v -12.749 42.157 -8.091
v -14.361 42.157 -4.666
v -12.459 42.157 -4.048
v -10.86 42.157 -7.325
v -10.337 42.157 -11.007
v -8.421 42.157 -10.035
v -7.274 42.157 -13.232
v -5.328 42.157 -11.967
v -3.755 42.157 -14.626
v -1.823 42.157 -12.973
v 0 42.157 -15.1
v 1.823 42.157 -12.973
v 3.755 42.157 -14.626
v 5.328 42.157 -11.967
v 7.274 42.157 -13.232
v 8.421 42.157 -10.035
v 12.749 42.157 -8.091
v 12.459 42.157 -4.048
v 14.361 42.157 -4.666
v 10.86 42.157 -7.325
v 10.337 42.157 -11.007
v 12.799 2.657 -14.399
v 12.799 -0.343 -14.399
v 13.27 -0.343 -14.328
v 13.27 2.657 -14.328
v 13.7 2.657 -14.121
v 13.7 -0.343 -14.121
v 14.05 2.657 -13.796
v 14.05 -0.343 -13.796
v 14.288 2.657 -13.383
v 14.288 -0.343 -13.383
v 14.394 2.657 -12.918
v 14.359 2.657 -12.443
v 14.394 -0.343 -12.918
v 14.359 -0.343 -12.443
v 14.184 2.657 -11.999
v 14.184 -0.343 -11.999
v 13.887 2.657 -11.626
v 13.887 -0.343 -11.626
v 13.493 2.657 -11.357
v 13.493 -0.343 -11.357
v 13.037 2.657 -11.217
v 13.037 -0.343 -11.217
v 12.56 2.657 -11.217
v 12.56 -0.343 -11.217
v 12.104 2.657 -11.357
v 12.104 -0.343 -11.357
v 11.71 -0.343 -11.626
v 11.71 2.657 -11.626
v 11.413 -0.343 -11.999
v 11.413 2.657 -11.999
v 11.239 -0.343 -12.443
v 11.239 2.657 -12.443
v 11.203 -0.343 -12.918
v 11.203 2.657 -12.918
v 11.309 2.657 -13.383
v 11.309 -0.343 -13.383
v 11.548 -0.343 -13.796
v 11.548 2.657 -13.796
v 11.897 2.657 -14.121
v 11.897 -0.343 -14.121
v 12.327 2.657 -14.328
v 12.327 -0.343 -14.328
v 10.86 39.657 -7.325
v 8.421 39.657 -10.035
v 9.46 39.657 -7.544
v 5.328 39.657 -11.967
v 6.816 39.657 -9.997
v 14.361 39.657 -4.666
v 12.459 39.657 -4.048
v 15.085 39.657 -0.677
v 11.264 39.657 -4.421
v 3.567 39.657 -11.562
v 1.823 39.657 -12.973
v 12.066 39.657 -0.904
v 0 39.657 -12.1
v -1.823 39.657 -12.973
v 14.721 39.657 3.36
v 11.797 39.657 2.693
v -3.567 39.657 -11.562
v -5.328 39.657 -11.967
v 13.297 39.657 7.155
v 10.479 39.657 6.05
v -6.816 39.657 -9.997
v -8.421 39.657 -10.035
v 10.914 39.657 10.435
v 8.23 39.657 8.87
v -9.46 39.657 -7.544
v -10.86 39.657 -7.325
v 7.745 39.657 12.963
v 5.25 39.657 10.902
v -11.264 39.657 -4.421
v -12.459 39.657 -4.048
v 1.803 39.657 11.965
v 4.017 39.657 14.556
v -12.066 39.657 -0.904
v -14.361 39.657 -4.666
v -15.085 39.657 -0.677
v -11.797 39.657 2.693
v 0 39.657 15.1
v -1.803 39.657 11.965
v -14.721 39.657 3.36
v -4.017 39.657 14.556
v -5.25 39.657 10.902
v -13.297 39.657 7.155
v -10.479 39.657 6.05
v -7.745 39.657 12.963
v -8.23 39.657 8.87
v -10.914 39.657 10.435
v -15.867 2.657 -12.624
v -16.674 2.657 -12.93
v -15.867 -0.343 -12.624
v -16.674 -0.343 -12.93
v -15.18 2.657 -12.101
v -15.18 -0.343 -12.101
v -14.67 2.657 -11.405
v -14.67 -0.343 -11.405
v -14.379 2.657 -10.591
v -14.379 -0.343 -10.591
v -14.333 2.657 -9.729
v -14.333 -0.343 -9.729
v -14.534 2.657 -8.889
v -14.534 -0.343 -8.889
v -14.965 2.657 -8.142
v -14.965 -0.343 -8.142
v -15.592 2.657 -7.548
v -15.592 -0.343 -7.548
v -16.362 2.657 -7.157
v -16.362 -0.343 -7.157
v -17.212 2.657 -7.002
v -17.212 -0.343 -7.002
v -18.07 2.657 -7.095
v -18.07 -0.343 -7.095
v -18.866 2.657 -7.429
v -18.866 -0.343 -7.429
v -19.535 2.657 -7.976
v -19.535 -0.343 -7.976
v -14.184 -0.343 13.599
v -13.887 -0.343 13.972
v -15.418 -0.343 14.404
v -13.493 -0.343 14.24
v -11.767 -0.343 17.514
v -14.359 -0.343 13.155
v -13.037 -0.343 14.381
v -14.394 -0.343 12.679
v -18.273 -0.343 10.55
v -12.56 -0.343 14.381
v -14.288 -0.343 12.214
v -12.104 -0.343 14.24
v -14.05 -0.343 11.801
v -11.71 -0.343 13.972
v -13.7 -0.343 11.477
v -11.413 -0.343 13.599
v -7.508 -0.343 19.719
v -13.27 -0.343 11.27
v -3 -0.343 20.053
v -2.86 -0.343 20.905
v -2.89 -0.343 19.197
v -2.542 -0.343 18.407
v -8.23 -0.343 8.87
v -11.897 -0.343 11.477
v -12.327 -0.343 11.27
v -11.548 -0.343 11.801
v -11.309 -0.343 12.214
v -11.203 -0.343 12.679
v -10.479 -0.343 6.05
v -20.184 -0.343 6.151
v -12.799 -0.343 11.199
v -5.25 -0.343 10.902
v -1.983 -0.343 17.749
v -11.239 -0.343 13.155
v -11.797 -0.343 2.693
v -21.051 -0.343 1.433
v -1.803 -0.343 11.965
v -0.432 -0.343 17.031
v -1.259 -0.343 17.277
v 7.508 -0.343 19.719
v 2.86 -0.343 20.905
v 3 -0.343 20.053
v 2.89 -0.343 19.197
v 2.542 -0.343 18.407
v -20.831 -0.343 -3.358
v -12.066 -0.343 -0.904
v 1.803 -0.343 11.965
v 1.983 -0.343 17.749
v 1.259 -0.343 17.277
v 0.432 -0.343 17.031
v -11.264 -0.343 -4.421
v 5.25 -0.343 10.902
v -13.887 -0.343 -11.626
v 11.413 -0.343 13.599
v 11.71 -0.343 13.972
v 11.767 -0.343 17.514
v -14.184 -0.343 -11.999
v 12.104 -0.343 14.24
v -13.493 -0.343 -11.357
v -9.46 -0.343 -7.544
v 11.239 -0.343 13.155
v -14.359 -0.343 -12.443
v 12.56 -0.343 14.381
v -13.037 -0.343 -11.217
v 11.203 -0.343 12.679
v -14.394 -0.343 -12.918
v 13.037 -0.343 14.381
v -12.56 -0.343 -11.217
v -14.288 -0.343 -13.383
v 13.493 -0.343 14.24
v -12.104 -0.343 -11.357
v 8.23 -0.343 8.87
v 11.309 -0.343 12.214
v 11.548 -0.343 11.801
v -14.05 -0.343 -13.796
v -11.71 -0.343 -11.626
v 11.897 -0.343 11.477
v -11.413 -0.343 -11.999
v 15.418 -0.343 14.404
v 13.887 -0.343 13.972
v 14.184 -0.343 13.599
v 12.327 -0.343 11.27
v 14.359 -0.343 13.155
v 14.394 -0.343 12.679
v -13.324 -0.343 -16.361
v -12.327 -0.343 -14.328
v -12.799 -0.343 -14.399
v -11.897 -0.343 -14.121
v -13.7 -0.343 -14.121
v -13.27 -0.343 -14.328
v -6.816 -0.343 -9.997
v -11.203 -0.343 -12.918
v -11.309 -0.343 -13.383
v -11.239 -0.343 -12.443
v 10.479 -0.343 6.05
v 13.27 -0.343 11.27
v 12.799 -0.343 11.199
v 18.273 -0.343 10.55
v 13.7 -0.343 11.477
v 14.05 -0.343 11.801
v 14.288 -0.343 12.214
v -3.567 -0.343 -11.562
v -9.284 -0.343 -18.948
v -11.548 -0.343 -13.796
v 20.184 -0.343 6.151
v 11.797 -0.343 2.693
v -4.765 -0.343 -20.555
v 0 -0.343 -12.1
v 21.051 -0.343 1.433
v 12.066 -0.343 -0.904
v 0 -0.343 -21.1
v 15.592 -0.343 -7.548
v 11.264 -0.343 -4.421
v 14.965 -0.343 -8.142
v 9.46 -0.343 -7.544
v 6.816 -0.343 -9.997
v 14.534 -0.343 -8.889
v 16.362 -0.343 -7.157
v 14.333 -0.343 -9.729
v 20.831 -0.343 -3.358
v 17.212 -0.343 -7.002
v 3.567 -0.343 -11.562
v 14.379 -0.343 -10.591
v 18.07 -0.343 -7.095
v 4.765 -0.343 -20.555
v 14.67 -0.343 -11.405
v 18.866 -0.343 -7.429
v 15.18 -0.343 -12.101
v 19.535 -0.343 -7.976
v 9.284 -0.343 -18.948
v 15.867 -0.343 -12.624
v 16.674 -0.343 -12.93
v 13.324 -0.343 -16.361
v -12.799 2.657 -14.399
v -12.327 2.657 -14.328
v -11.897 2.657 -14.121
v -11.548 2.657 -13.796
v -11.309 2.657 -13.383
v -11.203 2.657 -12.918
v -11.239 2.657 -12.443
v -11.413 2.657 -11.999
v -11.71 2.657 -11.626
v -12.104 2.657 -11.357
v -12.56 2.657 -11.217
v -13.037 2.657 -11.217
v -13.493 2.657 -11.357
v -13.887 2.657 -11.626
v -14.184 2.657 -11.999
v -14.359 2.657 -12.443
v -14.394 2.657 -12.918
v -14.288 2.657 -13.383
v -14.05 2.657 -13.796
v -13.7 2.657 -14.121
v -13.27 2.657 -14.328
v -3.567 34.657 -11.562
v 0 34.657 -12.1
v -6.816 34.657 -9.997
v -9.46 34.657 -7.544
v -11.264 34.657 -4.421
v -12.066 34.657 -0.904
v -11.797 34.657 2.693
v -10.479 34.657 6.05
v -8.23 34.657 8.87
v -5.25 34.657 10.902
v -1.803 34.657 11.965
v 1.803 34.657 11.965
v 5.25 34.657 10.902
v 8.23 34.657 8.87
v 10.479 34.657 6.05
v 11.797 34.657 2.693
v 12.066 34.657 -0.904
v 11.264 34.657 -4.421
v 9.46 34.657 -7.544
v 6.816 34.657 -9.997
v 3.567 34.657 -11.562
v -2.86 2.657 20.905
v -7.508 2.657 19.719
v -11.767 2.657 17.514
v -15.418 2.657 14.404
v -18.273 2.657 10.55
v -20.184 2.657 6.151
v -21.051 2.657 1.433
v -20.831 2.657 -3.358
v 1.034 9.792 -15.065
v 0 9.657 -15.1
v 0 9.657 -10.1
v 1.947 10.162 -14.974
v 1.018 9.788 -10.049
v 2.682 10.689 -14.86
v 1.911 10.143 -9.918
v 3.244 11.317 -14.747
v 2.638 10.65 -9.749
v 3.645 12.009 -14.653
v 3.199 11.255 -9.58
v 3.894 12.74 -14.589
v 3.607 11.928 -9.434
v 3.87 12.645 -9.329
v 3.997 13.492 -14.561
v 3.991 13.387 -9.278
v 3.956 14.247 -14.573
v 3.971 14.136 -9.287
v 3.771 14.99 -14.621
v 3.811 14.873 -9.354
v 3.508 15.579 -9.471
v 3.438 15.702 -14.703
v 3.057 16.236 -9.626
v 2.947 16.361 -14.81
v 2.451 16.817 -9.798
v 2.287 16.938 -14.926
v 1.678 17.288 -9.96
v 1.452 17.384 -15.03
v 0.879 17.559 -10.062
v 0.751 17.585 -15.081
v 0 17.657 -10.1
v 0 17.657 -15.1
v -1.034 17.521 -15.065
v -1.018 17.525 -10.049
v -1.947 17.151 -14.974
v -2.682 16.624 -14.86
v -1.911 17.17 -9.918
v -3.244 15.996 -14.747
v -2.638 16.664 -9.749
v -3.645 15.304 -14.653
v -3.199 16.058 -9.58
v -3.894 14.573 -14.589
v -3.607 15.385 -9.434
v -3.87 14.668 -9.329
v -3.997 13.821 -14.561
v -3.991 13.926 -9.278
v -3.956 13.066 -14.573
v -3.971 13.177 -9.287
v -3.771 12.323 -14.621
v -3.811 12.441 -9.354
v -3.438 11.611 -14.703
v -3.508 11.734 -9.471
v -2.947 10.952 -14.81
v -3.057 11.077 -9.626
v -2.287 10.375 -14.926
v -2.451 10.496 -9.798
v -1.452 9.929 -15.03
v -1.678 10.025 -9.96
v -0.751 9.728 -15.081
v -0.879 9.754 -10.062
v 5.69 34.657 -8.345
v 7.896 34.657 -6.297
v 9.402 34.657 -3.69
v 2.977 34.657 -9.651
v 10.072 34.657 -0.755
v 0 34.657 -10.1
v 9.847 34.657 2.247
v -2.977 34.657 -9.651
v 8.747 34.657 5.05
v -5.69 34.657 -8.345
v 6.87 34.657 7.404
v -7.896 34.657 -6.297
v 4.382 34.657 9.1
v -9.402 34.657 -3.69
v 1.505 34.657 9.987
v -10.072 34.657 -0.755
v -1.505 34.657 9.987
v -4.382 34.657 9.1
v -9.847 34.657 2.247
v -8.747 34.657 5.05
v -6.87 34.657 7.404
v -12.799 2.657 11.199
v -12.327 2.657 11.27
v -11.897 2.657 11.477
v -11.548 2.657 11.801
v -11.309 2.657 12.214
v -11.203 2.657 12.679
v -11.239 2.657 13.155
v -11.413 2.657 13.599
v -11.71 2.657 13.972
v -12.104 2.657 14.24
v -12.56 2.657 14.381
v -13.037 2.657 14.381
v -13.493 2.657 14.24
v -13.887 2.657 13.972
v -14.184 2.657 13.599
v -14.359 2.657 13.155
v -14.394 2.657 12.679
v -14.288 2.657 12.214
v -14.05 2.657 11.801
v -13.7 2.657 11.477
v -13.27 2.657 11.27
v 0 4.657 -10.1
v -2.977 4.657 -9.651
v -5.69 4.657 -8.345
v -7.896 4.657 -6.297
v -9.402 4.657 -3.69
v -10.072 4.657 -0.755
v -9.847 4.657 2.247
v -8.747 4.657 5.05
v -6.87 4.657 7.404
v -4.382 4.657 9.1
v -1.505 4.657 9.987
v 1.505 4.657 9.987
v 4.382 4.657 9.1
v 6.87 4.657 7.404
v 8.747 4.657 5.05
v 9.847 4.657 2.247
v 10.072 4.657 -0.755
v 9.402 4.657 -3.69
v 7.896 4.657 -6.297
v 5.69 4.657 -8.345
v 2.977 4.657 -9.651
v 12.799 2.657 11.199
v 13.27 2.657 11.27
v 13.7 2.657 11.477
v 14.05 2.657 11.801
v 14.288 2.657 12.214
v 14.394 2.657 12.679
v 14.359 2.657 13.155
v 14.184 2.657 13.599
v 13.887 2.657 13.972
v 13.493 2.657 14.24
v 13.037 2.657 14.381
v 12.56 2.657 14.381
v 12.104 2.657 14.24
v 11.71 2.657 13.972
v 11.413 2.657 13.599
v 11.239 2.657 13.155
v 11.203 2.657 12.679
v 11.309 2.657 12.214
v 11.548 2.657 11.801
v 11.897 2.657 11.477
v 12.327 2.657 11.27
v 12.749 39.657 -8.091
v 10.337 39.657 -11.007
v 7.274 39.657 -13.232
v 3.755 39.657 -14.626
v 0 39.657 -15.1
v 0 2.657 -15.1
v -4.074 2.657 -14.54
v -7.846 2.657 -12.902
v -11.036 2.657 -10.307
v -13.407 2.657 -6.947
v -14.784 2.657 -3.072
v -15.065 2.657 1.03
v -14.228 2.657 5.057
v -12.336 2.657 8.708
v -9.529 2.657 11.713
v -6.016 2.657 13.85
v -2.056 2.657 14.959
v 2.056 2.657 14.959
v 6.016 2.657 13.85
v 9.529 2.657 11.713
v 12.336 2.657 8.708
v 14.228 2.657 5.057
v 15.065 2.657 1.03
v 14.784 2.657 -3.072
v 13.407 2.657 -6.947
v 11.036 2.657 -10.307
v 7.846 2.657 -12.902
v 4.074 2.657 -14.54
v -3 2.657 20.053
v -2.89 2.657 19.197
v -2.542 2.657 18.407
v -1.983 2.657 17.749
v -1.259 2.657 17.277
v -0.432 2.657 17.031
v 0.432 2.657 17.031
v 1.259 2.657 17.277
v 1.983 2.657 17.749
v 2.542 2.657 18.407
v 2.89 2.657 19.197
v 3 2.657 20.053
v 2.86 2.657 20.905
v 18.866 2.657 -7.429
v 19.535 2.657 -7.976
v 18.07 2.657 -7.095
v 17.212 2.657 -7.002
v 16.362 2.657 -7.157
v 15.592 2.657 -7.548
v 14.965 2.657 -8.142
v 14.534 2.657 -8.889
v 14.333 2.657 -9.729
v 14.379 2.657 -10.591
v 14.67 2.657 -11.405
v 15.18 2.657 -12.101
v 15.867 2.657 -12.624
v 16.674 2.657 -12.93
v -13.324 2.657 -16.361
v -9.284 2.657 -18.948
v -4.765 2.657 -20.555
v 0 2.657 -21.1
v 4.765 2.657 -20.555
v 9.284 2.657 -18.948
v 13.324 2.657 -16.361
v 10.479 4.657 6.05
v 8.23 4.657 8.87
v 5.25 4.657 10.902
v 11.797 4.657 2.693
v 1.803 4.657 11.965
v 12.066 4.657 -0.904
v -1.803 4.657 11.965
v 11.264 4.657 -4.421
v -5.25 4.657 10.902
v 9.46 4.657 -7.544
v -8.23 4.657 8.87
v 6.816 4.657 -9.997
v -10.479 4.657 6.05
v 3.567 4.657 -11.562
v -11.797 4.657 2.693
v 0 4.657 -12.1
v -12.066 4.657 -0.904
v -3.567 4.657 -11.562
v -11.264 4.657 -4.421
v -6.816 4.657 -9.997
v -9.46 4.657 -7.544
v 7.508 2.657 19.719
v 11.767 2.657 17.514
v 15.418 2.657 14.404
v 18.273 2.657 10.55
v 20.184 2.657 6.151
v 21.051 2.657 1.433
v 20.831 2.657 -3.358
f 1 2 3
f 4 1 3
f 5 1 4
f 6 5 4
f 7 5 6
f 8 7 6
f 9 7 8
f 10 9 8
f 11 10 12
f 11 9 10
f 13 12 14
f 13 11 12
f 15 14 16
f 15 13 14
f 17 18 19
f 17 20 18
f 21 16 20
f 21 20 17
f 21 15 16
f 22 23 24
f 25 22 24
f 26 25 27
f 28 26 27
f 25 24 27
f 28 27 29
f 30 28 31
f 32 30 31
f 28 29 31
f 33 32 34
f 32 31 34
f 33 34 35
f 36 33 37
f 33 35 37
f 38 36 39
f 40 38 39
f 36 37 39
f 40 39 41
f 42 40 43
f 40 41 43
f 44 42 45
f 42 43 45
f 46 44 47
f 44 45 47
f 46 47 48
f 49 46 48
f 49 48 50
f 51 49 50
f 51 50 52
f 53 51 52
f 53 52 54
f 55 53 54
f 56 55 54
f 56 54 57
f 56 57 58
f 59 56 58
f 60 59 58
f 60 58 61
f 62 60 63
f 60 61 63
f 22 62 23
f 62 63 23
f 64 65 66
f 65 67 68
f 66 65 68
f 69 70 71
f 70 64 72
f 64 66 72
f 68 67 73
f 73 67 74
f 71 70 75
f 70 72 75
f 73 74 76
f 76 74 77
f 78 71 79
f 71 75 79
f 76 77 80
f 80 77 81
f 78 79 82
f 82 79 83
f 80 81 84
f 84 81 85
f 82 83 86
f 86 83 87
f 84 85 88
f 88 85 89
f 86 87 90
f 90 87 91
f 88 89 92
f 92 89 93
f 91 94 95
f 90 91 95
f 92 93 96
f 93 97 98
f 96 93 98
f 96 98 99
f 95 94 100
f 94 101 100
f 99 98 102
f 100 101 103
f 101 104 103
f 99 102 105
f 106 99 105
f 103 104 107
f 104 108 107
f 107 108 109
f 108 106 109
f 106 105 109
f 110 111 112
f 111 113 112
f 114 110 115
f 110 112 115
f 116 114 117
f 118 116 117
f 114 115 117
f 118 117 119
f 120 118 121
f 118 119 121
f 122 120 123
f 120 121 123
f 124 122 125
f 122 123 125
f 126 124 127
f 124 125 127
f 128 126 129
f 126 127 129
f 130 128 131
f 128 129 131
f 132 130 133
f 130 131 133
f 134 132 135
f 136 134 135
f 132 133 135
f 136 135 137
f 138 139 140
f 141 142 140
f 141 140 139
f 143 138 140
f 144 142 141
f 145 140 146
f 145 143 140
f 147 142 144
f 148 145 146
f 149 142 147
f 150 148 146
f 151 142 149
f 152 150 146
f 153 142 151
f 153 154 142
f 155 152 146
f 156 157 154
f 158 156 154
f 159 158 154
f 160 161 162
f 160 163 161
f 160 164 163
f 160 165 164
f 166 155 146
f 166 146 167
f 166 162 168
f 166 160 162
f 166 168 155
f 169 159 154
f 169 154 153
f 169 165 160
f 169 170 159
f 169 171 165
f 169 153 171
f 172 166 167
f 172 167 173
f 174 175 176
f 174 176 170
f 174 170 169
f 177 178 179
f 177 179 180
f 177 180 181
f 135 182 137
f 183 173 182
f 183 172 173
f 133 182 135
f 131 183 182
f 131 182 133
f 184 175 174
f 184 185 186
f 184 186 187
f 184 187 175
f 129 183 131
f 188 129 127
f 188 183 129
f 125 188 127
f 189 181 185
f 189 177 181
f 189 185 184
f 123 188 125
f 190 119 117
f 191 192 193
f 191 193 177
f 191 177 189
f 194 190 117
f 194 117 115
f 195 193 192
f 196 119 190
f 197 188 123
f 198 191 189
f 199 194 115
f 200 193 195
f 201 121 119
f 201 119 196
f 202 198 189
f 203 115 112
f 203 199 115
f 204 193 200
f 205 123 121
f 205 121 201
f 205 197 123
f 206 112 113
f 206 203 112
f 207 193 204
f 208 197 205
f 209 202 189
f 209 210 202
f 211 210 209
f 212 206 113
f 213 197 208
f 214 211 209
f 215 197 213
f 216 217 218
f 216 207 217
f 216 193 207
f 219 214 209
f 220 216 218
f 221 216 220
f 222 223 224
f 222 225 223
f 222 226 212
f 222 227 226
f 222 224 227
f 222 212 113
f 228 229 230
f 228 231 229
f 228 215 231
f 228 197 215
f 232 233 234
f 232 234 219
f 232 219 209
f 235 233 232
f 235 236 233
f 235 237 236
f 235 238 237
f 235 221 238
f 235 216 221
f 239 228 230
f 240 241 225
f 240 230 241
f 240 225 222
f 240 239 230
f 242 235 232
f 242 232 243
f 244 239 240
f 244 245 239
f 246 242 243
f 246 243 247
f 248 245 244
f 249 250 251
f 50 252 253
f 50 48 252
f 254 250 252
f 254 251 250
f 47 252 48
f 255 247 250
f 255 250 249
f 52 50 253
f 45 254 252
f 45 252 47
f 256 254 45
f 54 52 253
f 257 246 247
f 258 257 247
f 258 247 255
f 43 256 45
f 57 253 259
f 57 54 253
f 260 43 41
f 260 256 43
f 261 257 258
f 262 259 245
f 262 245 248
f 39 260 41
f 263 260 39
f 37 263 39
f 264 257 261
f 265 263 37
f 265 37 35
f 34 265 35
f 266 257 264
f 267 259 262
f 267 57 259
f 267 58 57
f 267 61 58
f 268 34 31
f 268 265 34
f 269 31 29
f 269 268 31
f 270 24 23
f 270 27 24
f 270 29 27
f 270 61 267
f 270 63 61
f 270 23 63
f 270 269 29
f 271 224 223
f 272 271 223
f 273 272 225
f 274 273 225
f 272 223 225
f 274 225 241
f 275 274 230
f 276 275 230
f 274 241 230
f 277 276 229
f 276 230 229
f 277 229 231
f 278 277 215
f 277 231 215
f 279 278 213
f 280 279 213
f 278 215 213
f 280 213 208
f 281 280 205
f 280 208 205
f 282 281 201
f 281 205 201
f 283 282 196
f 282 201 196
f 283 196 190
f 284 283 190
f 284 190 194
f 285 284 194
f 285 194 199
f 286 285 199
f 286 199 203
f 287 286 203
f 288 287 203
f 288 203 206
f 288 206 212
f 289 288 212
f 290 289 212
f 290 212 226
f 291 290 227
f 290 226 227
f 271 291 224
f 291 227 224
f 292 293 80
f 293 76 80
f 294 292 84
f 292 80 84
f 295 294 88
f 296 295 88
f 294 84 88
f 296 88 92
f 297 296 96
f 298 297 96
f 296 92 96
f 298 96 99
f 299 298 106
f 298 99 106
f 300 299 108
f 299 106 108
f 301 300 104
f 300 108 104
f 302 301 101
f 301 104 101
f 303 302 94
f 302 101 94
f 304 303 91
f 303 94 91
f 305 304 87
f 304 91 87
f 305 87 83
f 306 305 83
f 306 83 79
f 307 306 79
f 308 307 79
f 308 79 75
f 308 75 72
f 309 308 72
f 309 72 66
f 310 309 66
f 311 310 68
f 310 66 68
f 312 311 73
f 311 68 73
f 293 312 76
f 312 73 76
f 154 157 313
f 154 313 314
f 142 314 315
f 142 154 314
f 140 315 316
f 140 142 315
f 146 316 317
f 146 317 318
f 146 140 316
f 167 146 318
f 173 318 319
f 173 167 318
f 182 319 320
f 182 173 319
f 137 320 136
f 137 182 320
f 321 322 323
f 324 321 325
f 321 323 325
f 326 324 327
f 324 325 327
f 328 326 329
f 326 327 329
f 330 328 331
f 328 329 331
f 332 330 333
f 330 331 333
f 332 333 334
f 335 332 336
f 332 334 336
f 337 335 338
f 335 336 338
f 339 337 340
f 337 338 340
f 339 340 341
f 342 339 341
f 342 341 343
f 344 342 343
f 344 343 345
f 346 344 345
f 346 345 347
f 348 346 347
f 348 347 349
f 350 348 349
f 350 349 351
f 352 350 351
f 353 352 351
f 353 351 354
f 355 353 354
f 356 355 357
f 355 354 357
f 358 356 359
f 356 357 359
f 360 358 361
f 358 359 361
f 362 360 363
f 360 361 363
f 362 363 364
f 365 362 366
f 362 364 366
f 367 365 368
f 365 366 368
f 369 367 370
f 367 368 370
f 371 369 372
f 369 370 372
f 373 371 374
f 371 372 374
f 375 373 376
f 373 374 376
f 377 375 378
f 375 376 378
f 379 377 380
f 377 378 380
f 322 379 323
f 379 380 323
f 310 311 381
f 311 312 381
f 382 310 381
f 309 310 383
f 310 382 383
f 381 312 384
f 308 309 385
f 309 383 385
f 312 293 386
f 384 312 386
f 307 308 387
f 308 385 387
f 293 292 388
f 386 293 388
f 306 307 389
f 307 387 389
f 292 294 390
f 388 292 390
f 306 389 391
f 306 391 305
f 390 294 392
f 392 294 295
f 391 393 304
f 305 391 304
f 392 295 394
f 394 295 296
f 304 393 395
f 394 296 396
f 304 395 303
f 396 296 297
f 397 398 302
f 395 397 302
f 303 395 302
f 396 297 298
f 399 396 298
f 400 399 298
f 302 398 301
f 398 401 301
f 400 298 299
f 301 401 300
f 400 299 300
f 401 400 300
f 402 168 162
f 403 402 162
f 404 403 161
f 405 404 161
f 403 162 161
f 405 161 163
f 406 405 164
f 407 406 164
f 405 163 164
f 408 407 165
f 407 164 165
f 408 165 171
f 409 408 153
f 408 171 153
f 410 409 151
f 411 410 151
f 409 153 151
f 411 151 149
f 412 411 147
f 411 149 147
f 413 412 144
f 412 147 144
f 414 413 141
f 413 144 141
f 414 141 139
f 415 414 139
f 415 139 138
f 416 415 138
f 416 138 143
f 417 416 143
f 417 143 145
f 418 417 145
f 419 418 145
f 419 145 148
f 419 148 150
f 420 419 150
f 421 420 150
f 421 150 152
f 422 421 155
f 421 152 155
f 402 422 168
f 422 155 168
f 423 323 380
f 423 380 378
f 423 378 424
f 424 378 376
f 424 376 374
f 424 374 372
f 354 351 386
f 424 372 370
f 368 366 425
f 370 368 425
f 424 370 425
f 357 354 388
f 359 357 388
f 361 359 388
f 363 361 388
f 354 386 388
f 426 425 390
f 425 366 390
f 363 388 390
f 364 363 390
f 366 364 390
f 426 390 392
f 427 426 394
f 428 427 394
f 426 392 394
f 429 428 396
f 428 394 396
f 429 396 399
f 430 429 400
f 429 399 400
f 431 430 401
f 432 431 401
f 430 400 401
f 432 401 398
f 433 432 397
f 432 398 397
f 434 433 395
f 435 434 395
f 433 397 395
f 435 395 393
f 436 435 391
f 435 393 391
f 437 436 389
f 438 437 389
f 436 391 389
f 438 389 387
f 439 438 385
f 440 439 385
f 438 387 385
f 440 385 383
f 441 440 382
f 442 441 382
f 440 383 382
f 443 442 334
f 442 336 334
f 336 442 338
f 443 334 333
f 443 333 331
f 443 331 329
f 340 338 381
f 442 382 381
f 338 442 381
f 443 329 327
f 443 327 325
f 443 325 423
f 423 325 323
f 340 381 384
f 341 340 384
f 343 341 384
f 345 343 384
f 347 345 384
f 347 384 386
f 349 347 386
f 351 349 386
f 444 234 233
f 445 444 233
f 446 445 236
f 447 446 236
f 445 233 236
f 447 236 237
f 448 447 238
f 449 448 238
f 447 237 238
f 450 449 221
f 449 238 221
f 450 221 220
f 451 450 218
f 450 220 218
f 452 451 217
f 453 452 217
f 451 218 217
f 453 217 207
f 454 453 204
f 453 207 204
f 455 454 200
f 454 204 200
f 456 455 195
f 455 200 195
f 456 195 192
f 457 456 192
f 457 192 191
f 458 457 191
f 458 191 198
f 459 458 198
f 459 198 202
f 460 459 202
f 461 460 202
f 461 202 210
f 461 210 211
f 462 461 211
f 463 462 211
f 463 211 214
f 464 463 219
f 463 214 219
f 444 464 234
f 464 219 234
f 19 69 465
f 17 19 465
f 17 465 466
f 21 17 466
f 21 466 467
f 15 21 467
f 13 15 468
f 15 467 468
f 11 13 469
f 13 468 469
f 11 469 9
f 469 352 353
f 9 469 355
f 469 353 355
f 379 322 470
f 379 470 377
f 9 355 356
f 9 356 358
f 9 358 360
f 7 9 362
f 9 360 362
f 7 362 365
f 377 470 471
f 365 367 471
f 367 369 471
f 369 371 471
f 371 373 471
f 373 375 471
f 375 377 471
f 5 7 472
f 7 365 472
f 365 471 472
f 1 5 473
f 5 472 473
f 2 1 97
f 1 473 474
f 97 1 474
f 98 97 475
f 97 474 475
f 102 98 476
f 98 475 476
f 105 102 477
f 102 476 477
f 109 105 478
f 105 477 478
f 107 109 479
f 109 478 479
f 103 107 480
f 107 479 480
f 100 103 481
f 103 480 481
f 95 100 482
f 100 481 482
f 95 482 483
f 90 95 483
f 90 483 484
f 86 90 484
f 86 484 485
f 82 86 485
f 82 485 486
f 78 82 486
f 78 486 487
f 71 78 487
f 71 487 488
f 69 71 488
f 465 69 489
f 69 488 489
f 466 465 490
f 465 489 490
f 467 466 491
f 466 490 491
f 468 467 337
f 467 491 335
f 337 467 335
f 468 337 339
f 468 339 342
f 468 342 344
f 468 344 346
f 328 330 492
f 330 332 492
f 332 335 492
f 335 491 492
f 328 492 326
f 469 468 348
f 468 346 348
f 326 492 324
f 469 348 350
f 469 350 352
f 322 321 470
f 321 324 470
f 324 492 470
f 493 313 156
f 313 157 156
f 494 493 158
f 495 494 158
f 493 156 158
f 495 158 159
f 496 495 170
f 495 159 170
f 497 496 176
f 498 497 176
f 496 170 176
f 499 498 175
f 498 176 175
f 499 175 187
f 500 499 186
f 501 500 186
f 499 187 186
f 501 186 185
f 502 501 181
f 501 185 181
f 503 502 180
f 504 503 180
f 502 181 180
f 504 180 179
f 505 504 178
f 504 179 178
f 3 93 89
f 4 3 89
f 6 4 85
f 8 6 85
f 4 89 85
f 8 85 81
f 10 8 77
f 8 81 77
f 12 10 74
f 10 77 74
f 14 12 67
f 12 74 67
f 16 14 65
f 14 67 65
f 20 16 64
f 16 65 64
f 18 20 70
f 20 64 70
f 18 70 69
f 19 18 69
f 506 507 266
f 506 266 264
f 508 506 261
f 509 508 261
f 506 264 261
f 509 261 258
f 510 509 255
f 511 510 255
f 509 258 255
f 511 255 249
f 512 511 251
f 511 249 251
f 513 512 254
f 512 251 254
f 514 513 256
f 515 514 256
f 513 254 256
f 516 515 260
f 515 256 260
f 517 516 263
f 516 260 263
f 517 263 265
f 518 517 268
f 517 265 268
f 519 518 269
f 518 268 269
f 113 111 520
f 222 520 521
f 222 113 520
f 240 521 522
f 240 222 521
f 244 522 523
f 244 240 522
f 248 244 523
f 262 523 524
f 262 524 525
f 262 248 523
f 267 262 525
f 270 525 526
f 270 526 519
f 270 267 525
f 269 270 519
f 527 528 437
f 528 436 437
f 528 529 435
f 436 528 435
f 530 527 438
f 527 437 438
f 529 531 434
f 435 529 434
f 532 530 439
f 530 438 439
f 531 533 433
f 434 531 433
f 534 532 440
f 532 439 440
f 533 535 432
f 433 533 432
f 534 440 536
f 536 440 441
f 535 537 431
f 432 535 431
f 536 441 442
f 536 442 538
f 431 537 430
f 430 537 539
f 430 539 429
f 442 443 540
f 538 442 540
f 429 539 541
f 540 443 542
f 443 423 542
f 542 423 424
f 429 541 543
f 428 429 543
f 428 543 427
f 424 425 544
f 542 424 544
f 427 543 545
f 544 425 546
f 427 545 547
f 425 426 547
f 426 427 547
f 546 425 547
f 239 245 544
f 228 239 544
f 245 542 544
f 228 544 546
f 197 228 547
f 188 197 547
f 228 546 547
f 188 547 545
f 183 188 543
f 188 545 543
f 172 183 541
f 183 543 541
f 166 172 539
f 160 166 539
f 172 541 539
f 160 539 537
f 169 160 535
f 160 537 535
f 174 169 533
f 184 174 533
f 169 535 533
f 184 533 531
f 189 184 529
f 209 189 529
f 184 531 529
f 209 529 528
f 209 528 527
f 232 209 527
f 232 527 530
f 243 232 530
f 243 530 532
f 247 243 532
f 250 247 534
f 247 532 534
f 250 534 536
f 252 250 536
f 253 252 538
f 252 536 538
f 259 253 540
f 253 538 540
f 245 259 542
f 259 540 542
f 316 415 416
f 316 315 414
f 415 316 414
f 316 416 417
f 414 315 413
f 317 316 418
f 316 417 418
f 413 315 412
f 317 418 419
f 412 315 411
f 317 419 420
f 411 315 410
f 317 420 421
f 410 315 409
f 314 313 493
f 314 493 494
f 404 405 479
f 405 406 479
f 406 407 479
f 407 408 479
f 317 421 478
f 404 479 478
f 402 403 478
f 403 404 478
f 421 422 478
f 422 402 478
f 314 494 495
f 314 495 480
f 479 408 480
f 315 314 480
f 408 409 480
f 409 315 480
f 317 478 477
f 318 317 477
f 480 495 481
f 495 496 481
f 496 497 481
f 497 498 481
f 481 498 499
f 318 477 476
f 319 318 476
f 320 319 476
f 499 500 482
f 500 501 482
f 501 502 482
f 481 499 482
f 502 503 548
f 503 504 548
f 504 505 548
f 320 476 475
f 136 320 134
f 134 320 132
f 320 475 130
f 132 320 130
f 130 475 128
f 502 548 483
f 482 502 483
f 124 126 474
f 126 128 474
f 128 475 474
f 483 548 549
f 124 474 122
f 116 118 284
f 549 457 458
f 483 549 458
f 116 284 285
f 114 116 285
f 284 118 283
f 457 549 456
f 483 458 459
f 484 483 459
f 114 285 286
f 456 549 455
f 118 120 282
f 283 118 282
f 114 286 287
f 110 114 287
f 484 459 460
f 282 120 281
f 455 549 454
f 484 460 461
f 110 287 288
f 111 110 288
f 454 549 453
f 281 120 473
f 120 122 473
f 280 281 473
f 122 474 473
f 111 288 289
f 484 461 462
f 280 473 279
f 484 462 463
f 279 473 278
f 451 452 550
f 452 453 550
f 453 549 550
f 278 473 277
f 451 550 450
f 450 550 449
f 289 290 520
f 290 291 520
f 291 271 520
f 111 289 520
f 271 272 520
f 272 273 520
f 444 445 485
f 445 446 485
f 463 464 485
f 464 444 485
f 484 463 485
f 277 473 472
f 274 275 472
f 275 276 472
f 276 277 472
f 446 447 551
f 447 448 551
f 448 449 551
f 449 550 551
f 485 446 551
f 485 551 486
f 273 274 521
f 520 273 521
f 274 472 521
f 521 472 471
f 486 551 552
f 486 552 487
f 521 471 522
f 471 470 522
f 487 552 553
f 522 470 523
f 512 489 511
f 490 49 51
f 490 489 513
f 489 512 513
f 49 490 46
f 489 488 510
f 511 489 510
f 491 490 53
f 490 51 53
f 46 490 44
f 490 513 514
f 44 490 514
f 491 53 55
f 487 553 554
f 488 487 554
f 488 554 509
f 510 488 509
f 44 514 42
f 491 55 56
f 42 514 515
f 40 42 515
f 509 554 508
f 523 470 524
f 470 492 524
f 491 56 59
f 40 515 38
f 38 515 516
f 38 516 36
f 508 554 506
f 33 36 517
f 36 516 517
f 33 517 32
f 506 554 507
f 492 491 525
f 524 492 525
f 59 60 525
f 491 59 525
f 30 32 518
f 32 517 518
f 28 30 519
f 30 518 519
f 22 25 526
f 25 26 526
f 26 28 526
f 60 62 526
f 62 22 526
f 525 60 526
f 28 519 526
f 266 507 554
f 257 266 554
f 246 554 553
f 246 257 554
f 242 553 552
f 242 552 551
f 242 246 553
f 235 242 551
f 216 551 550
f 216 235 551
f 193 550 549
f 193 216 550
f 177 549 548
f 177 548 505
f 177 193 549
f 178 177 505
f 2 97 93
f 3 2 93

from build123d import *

# Parameters (mm, degrees)
SKETCH_2_R          = 21.1
SKETCH_2_R_2        = 15.1
SKETCH_2_R_3        = 1.6
EXTRUDE_1_DEPTH     = 3
SKETCH_4_R          = 3
CUT_EXTRUDE_1_DEPTH = 3
SKETCH_5_R          = 4
CUT_EXTRUDE_2_DEPTH = 42
EXTRUDE_4_DEPTH     = 2.5


with BuildPart() as part:
    # 草图1 → 旋转1 (revolve)
    with BuildSketch(Plane.XY, mode=Mode.PRIVATE) as revolve_1_sk:
        Polygon((12.1, -0.34341598), (12.1, 4.65658402), (10.1, 4.65658402), (10.1, 34.65658402), (12.1, 34.65658402), (12.1, 39.65658402), (15.1, 39.65658402), (15.1, -0.34341598), align=None)
    revolve(revolve_1_sk.sketch.rotate(Axis((0, 0, 0), (0, 1, 0)), 90), axis=Axis((0, 0, 0), (0, 1, 0)))

    # 草图2 → 凸台-拉伸1 (add)
    with BuildSketch(Plane.XZ.offset(0.34341598)):
        with Locations(Location((0, 0, 0), (0, 0, 270))):
            Circle(SKETCH_2_R)
        with Locations(Location((0, 0, 0), (0, 0, 270))):
            Circle(SKETCH_2_R_2, mode=Mode.SUBTRACT)
        with Locations(Location((-12.798632739, 12.798632739, 0), (0, 0, 270))):
            Circle(SKETCH_2_R_3, mode=Mode.SUBTRACT)
        with Locations(Location((12.798632739, 12.798632739, 0), (0, 0, 270))):
            Circle(SKETCH_2_R_3, mode=Mode.SUBTRACT)
        with Locations(Location((12.798632739, -12.798632739, 0), (0, 0, 270))):
            Circle(SKETCH_2_R_3, mode=Mode.SUBTRACT)
        with Locations(Location((-12.798632739, -12.798632739, 0), (0, 0, 270))):
            Circle(SKETCH_2_R_3, mode=Mode.SUBTRACT)
    extrude(amount=-EXTRUDE_1_DEPTH)

    # 草图4 → 切除-拉伸1 (cut)
    with BuildSketch(Plane.XZ.offset(0.34341598)):
        with Locations((0, 20)):
            Circle(SKETCH_4_R)
        with Locations((17.320508076, -10)):
            Circle(SKETCH_4_R)
        with Locations((-17.320508076, -10)):
            Circle(SKETCH_4_R)
    extrude(amount=-CUT_EXTRUDE_1_DEPTH, mode=Mode.SUBTRACT)

    # 草图5 → 切除-拉伸2 (cut)
    with BuildSketch(Plane.XY):
        with Locations(Location((0, 13.65658402, 0), (0, 0, 270))):
            Circle(SKETCH_5_R)
    extrude(amount=-CUT_EXTRUDE_2_DEPTH, mode=Mode.SUBTRACT)

    # 草图6 → 凸台-拉伸4 (add)
    with BuildSketch(Plane(origin=(0, 39.65658402, 0), x_dir=(1, 0, 0), z_dir=(0, 1, 0))):
        with BuildLine():
            Line((12.458840363, 4.048122626), (14.360953396, 4.666156615))
            ThreePointArc((14.360953396, 4.666156615), (0, 15.1), (-14.360953396, 4.666156615))
            Line((-14.360953396, 4.666156615), (-12.458840363, 4.048122626))
            ThreePointArc((-12.458840363, 4.048122626), (0, 13.1), (12.458840363, 4.048122626))
        make_face()
    extrude(amount=EXTRUDE_4_DEPTH)


solid = part.part
